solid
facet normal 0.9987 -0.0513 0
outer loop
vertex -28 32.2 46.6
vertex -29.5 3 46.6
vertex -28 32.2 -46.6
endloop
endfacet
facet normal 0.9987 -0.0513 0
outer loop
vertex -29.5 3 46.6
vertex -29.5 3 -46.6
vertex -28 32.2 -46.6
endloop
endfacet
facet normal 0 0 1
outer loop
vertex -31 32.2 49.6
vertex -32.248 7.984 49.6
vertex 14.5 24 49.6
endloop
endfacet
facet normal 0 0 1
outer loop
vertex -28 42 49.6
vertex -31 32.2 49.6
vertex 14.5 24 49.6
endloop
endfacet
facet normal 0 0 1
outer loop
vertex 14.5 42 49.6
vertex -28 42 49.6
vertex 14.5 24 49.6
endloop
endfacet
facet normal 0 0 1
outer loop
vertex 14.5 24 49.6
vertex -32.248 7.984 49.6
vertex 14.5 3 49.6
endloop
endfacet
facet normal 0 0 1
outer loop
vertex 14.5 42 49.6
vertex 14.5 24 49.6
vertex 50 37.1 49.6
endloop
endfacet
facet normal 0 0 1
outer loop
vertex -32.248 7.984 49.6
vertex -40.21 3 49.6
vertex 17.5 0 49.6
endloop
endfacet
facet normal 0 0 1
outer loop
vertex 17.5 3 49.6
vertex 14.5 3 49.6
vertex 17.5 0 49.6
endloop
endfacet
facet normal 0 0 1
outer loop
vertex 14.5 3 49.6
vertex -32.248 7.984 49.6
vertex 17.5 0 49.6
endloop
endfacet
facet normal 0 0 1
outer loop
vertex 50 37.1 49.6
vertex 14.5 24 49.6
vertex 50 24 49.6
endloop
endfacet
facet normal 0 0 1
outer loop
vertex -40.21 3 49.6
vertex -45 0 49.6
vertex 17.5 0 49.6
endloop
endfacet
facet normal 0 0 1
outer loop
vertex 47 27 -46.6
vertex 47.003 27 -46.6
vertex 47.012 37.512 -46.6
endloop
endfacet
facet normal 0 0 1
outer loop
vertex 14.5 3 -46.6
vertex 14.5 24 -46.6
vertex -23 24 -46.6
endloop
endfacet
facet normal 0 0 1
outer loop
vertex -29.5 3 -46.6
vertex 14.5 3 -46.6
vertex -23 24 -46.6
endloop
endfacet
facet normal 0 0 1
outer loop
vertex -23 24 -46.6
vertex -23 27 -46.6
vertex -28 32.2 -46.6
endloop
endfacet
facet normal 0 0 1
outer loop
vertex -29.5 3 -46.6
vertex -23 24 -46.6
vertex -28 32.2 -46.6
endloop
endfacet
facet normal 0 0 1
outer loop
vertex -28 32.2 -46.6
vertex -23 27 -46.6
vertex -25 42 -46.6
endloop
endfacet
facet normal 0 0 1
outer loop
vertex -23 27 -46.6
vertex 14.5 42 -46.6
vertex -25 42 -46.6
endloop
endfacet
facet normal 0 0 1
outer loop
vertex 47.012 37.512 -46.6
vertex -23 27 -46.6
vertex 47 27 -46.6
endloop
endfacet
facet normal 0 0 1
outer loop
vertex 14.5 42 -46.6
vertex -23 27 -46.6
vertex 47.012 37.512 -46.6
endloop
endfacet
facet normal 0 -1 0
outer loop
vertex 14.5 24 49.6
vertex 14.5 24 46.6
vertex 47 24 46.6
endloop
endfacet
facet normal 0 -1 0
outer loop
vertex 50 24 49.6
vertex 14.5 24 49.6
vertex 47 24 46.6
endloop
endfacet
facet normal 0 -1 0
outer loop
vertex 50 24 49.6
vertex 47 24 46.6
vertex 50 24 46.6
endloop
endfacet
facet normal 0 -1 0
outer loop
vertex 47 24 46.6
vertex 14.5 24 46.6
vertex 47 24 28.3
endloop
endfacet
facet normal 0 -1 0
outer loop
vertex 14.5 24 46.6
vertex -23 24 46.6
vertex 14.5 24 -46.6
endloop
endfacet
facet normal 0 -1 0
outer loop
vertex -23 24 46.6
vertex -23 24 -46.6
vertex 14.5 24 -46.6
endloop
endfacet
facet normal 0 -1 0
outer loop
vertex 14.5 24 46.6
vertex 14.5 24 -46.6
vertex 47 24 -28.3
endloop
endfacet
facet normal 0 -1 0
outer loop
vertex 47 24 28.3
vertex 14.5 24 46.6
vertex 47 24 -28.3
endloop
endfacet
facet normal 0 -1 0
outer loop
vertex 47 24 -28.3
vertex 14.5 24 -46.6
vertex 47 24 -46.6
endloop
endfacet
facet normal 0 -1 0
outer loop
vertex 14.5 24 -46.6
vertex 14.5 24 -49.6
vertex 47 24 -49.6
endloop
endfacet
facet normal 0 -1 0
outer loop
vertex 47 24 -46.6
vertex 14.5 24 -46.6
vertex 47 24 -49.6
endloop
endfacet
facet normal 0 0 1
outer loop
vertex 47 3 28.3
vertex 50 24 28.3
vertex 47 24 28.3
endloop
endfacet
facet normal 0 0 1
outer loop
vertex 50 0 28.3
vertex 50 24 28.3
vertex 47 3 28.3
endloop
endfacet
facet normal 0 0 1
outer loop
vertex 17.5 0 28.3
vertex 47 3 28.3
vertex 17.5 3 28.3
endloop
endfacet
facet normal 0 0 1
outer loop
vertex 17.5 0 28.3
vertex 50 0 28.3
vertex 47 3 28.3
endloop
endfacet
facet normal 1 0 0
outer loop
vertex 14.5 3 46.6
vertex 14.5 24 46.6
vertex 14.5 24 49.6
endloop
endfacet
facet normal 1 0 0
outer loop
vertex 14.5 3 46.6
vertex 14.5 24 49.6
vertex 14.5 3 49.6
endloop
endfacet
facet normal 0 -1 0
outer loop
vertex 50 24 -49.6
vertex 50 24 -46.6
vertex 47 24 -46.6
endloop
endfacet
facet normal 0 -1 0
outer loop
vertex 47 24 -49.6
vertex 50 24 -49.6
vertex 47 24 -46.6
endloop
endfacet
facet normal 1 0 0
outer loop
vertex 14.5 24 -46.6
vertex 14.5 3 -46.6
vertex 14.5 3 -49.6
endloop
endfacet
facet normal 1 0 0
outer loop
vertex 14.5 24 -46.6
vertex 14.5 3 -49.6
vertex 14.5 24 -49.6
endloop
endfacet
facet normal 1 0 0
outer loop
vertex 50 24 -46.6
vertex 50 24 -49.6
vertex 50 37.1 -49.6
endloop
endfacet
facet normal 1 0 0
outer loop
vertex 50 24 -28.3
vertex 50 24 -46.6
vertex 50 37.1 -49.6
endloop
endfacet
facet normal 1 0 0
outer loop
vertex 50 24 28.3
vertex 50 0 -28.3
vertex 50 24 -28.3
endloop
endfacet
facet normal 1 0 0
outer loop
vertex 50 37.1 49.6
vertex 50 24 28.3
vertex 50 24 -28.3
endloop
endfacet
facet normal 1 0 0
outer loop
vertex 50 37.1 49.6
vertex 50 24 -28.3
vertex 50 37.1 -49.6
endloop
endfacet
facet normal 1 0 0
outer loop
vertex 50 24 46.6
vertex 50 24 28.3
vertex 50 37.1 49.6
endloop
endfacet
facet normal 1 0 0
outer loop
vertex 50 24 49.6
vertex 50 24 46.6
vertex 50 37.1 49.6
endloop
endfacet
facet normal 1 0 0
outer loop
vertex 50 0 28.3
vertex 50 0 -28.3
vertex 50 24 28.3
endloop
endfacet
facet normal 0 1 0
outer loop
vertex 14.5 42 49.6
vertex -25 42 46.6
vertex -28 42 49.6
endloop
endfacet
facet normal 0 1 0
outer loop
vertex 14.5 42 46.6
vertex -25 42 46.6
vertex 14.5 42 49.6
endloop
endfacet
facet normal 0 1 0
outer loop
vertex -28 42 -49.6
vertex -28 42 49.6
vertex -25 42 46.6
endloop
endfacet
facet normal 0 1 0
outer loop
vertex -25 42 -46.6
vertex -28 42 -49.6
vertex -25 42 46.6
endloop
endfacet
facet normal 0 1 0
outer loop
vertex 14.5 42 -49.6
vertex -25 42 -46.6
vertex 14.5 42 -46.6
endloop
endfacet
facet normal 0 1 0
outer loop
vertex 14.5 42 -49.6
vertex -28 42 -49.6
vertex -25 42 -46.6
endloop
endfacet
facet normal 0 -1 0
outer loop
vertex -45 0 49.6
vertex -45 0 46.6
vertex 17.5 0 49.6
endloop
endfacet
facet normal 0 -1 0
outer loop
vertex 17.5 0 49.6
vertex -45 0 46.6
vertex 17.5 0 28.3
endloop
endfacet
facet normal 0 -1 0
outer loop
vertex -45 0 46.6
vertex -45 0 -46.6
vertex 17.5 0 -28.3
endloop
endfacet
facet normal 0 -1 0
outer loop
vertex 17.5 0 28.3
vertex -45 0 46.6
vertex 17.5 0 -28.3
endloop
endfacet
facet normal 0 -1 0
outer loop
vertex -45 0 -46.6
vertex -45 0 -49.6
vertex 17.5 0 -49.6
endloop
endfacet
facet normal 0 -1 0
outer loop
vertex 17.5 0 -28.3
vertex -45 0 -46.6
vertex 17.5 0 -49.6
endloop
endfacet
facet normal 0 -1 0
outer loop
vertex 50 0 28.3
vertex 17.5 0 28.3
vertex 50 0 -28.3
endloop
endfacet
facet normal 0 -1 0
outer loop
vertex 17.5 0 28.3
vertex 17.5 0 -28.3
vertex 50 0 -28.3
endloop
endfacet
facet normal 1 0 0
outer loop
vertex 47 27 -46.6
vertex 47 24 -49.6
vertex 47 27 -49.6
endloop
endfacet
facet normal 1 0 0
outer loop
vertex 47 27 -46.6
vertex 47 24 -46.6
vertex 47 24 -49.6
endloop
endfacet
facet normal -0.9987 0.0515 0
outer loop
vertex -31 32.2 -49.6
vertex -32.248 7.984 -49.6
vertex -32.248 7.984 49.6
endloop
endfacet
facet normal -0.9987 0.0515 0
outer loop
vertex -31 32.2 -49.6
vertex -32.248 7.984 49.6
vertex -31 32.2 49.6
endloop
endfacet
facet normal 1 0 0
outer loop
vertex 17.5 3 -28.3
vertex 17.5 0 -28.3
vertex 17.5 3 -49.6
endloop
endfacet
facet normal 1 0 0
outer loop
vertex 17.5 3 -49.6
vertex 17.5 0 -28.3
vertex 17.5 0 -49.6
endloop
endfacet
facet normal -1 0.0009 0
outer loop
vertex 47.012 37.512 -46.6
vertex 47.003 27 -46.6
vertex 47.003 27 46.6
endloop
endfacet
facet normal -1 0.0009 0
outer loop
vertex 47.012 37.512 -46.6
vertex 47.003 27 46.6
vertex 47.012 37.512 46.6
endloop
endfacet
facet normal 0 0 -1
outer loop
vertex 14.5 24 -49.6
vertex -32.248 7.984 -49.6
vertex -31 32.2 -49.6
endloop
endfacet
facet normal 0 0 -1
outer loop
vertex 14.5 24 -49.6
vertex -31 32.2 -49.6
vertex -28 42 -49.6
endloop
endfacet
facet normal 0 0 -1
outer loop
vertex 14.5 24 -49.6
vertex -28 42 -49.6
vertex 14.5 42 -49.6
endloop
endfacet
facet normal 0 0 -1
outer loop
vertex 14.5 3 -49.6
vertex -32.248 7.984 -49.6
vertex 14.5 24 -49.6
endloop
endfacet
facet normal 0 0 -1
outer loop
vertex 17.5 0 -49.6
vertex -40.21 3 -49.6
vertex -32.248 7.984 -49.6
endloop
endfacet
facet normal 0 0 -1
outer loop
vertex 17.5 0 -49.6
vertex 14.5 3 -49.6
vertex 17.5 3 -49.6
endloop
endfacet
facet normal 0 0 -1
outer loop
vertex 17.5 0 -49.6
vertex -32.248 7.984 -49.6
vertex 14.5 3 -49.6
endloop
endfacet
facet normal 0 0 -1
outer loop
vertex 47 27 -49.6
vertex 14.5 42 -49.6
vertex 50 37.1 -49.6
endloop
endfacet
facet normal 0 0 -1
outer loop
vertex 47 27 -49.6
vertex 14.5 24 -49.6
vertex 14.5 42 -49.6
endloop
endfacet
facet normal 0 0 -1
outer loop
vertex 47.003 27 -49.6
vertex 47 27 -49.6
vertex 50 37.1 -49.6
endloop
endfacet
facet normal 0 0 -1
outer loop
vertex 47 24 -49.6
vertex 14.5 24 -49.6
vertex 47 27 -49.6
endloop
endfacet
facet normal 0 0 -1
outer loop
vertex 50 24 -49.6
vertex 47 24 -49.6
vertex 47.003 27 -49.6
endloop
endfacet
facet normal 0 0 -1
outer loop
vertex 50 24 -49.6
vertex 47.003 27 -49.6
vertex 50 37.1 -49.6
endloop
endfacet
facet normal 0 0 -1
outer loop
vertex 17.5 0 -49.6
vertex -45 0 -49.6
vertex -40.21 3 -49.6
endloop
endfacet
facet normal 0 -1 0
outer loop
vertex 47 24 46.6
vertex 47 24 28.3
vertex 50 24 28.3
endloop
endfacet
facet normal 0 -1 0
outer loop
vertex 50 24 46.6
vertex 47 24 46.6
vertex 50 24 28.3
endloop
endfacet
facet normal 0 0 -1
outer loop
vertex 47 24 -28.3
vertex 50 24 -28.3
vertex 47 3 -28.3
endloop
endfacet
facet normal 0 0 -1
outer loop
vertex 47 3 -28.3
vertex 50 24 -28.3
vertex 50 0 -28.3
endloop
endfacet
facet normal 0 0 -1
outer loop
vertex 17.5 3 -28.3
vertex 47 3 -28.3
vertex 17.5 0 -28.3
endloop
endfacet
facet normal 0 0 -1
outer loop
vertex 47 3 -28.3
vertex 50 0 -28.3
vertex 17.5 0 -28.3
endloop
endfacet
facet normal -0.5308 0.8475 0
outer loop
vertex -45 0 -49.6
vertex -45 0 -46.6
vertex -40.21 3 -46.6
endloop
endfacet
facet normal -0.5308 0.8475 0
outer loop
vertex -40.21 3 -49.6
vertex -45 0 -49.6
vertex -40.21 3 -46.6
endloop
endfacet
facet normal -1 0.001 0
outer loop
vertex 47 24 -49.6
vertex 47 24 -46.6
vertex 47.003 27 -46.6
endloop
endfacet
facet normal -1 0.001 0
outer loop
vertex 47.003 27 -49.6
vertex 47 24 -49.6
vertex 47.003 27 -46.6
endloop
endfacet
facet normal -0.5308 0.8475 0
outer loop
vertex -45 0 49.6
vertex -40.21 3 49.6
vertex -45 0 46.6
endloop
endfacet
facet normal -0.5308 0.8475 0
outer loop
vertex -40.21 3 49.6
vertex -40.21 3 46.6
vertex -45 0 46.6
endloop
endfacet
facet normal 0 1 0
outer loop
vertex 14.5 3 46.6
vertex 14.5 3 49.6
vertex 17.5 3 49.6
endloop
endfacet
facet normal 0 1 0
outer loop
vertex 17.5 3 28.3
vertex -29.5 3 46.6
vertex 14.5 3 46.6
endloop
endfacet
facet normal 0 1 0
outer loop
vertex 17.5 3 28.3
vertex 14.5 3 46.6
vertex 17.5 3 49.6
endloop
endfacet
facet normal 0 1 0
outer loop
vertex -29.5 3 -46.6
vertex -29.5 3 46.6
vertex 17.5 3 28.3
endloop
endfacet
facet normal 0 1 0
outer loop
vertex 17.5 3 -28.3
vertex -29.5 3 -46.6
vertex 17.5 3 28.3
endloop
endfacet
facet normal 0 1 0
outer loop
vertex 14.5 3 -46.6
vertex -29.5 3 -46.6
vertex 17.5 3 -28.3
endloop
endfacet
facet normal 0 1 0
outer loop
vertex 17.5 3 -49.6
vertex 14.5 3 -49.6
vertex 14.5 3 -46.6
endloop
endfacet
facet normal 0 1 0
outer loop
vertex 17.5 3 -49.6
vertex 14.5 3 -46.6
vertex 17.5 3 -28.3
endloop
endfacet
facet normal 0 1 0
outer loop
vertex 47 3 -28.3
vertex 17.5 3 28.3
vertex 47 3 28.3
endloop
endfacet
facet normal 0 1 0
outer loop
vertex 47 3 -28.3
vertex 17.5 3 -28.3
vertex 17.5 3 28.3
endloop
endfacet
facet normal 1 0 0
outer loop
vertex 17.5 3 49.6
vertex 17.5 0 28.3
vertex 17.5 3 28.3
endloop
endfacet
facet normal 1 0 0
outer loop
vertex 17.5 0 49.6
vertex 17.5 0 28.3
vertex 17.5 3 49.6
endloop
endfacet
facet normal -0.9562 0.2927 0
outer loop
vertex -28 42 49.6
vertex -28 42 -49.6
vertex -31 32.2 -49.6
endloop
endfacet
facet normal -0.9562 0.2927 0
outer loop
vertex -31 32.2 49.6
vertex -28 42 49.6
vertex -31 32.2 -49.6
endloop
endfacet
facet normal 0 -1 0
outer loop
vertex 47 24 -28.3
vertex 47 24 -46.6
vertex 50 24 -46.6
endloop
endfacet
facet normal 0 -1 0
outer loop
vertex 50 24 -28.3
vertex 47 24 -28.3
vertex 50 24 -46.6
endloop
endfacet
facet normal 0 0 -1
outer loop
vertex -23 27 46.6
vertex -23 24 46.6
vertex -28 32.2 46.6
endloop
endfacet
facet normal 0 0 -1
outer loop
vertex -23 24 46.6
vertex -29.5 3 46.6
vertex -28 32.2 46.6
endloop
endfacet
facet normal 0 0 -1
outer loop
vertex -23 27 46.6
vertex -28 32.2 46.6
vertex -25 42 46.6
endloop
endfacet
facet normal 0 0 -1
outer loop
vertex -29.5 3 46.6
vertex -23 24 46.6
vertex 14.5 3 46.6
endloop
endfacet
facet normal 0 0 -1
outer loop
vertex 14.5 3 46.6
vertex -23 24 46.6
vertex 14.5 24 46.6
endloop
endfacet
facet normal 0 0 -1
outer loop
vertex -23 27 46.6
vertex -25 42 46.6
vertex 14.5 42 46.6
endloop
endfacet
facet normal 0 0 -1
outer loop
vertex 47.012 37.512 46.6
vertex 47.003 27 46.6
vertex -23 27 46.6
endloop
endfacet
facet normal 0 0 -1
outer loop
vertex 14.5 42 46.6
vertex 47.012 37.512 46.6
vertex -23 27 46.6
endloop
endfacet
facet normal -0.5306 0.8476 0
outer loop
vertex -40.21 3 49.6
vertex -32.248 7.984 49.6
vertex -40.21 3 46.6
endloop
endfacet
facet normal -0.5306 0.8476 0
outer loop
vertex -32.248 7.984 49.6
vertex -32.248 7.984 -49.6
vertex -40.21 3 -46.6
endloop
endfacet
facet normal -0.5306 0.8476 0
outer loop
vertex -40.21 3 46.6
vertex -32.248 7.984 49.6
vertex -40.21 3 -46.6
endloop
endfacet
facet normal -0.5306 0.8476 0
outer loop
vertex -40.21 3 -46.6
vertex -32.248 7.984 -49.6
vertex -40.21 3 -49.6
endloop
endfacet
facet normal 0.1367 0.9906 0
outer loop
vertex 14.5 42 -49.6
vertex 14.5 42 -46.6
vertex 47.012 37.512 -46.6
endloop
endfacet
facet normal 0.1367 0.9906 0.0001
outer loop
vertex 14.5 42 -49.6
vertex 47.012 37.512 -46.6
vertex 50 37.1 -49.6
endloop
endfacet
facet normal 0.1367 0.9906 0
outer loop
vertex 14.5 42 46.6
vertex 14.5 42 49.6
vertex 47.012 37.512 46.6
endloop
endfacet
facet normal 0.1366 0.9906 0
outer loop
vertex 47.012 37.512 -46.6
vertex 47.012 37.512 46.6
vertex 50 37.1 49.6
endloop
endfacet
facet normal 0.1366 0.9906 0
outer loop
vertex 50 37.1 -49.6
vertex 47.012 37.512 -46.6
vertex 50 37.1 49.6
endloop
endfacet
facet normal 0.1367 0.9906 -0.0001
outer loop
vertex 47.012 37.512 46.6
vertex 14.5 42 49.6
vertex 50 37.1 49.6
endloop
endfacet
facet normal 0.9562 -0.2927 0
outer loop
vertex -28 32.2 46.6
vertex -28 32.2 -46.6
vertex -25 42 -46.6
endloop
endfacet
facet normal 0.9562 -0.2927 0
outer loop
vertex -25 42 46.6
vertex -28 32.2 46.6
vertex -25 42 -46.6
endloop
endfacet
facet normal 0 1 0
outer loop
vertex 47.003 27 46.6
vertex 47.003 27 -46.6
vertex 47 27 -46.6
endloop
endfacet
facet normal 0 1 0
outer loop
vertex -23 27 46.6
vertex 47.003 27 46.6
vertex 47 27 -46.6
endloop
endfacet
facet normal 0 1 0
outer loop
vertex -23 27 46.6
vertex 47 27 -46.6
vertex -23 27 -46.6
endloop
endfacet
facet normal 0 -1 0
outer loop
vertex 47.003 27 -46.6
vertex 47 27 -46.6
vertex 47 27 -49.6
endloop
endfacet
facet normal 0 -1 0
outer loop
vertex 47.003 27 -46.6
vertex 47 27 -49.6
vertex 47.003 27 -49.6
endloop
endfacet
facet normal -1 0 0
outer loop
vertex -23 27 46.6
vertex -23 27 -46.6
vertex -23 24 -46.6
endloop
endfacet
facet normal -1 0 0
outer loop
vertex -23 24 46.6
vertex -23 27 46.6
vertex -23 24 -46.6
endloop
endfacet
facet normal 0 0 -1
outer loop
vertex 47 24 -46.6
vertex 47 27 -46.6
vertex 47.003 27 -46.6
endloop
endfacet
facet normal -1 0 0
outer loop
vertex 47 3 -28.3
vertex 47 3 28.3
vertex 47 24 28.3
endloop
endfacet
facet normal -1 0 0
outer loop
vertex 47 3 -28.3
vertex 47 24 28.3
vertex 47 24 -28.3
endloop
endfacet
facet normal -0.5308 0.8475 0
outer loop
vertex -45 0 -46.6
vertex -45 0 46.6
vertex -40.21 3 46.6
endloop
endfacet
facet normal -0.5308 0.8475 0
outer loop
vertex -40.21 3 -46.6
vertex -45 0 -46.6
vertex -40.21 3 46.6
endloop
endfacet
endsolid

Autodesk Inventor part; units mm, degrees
ref_plane "YZ Plane" through (0, 0, 0) normal (1, 0, 0) x (0, 1, 0)
ref_plane "XZ Plane" through (0, 0, 0) normal (0, 1, 0) x (-1, 0, 0)
ref_plane "XY Plane" through (0, 0, 0) normal (0, 0, 1) x (1, 0, 0)
sketch "Esboço1" plane through (0, 0, 0) normal (0, 1, 0) x (-1, 0, 0)
  line L0 (50, 50) -> (50, -50)
  line L1 (-50, -50) -> (-50, 50)
  line L2 (-50, -2) -> (-50, 2)
  line L3 (-50, -2) -> (-50, -28.3)
  line L4 (-50, 2) -> (-50, 28.3)
  line L5 (-50, 28.3) -> (-17.5, 28.3)
  line L6 (-50, -28.3) -> (-17.5, -28.3)
  line L7 (-17.5, -28.3) -> (-17.5, -49.6)
  line L8 (-17.5, 28.3) -> (-17.5, 49.6)
  line L9 (-39.9, -28.3) -> (-27.6, -28.3)
  line L10 (-27.6, -28.3) -> (-27.6, -2.3)
  line L11 (-27.6, -2.3) -> (-39.9, -2.3)
  line L12 (-39.9, -2.3) -> (-39.9, -28.3)
  line L13 (-27.6, 28.3) -> (-27.6, 2.3)
  line L14 (-27.6, 2.3) -> (-39.9, 2.3)
  line L15 (-39.9, 2.3) -> (-39.9, 28.3)
  line L16 (50, 50) -> (45, 50)
  line L17 (50, -50) -> (45, -50)
  line L18 (45, 50) -> (45, -50)
  line L19 (-17.5, -28.3) -> (-14.5, -28.3)
  line L20 (-14.5, -49.6) -> (-17.5, -49.6)
  line L21 (-17.5, 28.3) -> (-14.5, 28.3)
  line L22 (-14.5, 49.6) -> (-17.5, 49.6)
  line L23 (-9.5, -35) -> (-9.5, 35)
  line L24 (-9.5, -35) -> (24.5, -35)
  line L25 (24.5, -35) -> (24.5, 35)
  line L26 (24.5, 35) -> (-9.5, 35)
  line L27 (29.5, 35) -> (29.5, -35)
  line L28 (-14.5, 49.6) -> (29.5, 49.6)
  line L29 (29.5, 49.6) -> (29.5, -49.6)
  line L30 (29.5, -49.6) -> (-14.5, -49.6)
  line L31 (26.5, -46.6) -> (26.5, 46.6)
  line L32 (-14.5, -28.3) -> (-17.5, -28.3)
  line L33 (-14.5, -28.3) -> (-14.5, -46.6)
  line L34 (-14.5, 46.6) -> (-14.5, 28.3)
  line L35 (26.5, -46.6) -> (-14.5, -46.6)
  line L36 (26.5, 46.6) -> (-14.5, 46.6)
  line L37 (-50, 28.3) -> (-47, 28.3)
  line L38 (-47, 28.3) -> (-47, -28.3)
  line L39 (-14.5, -28.3) -> (-14.5, -25.3)
  line L40 (-14.5, -25.3) -> (-17.5, -25.3)
  line L41 (-17.5, -25.3) -> (-22.5, -25.3)
  line L42 (-22.5, -25.3) -> (-22.5, -28.3)
  line L43 (-14.5, 28.3) -> (-14.5, 25.3)
  line L44 (-14.5, 25.3) -> (-17.5, 25.3)
  line L45 (-17.5, 25.3) -> (-22.5, 25.3)
  line L46 (-22.5, 25.3) -> (-22.5, 28.3)
  point P0 (0, 0)
  point P1 (-50, 0)
  point P2 (-33.75, -28.3)
  dimension "d0" = 100
  dimension "d1" = 100
  dimension "d2" = 4
  dimension "d3" = 26.3
  dimension "d4" = 26.3
  dimension "d5" = 32.5
  dimension "d6" = 32.5
  dimension "d7" = 21.3
  dimension "d8" = 21.3
  dimension "d9" = 12.3
  dimension "d10" = 26
  dimension "d11" = 26
  dimension "d12" = 5
  dimension "d13" = 5
  dimension "d14" = 3
  dimension "d15" = 3
  dimension "d17" = 70
  dimension "d18" = 34
  dimension "d19" = 5
  dimension "d20" = 3
  dimension "d23" = 3
  dimension "d42" = 5
  dimension "d43" = 3
  dimension "d44" = 5
extrude "Extrusão1" add sketch "Esboço1" along normal blind 3 contours L38 L5 L15 L14 L13 L46 L45 L44 L43 L34 L36 L31 L35 L33 L39 L40 L41 L42 L6 L10 L11 L12 | L12 L11 L10 L6 | L5 L13 L14 L15 | L42 L41 L40 L39 L19 L6 | L5 L21 L43 L44 L45 L46 | L23 L26 L25 L24
extrude "Extrusão2" add sketch "Esboço1" along normal blind 27 contours L1 L5 L38 L6
sketch "Esboço2" plane through (14.5, 0, -46.6) normal (0, 0, -1) x (-1, 0, 0)
  line L0 (41, 0) -> (0, 0) projected
  line L1 (41, 0) -> (59.5, 0)
  line L2 (41, 0) -> (41, 3) projected
  line L3 (41, 0) -> (41, 3)
  line L4 (41, 3) -> (0, 3) projected
  line L5 (-32.5, 3) -> (0, 3) projected
  line L6 (-32.5, 3) -> (-32.5, 27) projected
  line L7 (-32.5, 27) -> (-32.5, 24)
  line L8 (-32.5, 27) -> (3, 27)
  line L9 (3, 27) -> (3, 24)
  line L10 (3, 24) -> (-32.5, 24)
  line L11 (0, 3) -> (0, 27)
  line L12 (0, 3) -> (3, 3)
  line L13 (3, 3) -> (37, 3)
  line L14 (0, 3) -> (-35.5, 3)
  line L15 (-35.5, 0) -> (-35.5, 27) projected
  line L16 (-11.75, 3) -> (-23.75, 3)
  line L17 (-23.75, 3) -> (-23.75, 15)
  line L18 (-23.75, 15) -> (-11.75, 15)
  line L19 (-11.75, 15) -> (-11.75, 3)
  line L20 (3, 3) -> (3, 21)
  line L21 (0, 27) -> (0, 42)
  line L22 (37, 3) -> (37, 21)
  line L23 (37, 21) -> (3, 21)
  line L24 (41, 3) -> (55.9231, 3)
  line L25 (0, 3) -> (41, 3) projected
  line L26 (-32.5, 27) -> (-35.5, 27) projected
  line L27 (-32.5, 27) -> (37.5, 27)
  line L28 (0, 42) -> (38, 42)
  line L29 (0, 42) -> (39.5, 42)
  line L30 (39.5, 42) -> (42.5, 32.2)
  line L31 (3, 24) -> (37.5, 24)
  line L32 (37.5, 24) -> (37.5, 27)
  line L33 (-23.75, 3) -> (-11.75, 15)
  line L34 (-23.75, 15) -> (-11.75, 3)
  line L35 (42.5, 3) -> (44, 3)
  line L36 (44, 3) -> (42.5, 32.2)
  line L37 (59.5, 0) -> (57, 0)
  line L38 (-17.75, 24) -> (-17.75, 3)
  line L39 (0, 27) -> (0, 37)
  line L40 (-35.5, 27) -> (-35.5, 32)
  line L41 (39.5, 42) -> (42.5, 42)
  line L42 (42.5, 32.2) -> (45.5, 32.2)
  line L43 (43.7518, 7.8322) -> (46.7478, 7.9861)
  line L44 (45.5, 32.2) -> (42.5, 42)
  line L45 (45.5, 32.2) -> (46.7478, 7.9861)
  line L46 (59.5, 0) -> (62, 0)
  line L47 (59.5, 0) -> (46.7478, 7.9861)
  line L48 (0, 42) -> (-35.5, 37.1)
  line L49 (-35.5, 37.1) -> (-35.5, 32)
  point P0 (14.5, 0)
  point P1 (0, 24)
  point P2 (54.7096, 3)
  dimension "d28" = 18.5
  dimension "d31" = 3
  dimension "d32" = 35.5
  dimension "d33" = 3
  dimension "d34" = 34
  dimension "d35" = 12
  dimension "d36" = 12
  dimension "d37" = 18
  dimension "d38" = 15
  dimension "d50" = 18
  dimension "d55" = 70
  dimension "d57" = 38
  dimension "d61" = 1.5
  dimension "d62" = 2.5
  dimension "d63" = 10
  dimension "d64" = 5
  dimension "d65" = 3
  dimension "d66" = 3
  dimension "d67" = 3
  dimension "d68" = 2.5
extrude "Extrusão3" add sketch "Esboço1" along normal blind 3 contours L19 L33 L35 L31 L36 L34 L21 L8 L22 L28 L29 L27 L30 L20 L7
extrude "Extrusão7" add sketch "Esboço2" along normal blind 3 contours L2 L24 L47 L1 | L4 L22 L23 L20 L11 L10 L31 L32 L27 L8 L21 L28 L29 L30 L36 L24 | L4 L20 L23 L22 | L11 L8 L9 L10 | L10 L6 L8 L11 | L9 L27 L32 L31 | L8 L26 L40 L49 L48 L21
mirror "Espelhar2" about plane through (0, 0, 0) normal (0, 0, 1) of "Extrusão7"
sketch "Esboço4" plane through (14.5, 0, -46.6) normal (0, 0, 1) x (1, 0, 0)
  line L0 (32.5, 27) -> (-37.5, 27)
  line L1 (-37.5, 27) -> (-37.5, 24)
  line L2 (-37.5, 24) -> (32.5, 24)
  line L3 (32.5, 24) -> (32.5, 27)
  line L4 (32.5, 27) -> (35.5, 27)
  line L5 (35.5, 27) -> (35.5, 24)
  line L6 (35.5, 24) -> (32.5, 24)
  point P0 (-14.5, 0)
  dimension "d71" = 70
  dimension "d72" = 3
  dimension "d73" = 3
  dimension "d74" = 3
extrude "Extrusão8" add sketch "Esboço4" along normal blind 96.2
sketch "Esboço5" plane through (14.5, 42, 46.6) normal (0, 0, -1) x (-1, 0, 0)
  line L0 (-32.5, -15) -> (-32.5, -18) projected
  line L1 (-32.5, -18) -> (-32.5117, -4.4875)
  line L2 (0, 0) -> (-35.5, -4.9) projected
  line L3 (-32.5117, -4.4875) -> (-35.5, -4.9)
  line L4 (-35.5, -18) -> (0, -18) projected
  line L5 (-35.5, -4.9) -> (-35.5, -18)
  line L6 (-35.5, -18) -> (-32.5, -18)
  point P0 (14.5, -42)
extrude "Extrusão9" add sketch "Esboço5" along normal blind 96.2
sketch "Esboço6" plane through (17.5, 0, -49.6) normal (0, 0, -1) x (-1, 0, 0)
  line L0 (42.5, 42) -> (3, 42) projected
  line L1 (42.5, 42) -> (45.5, 42)
  line L2 (47, 3) -> (45.5, 32.2) projected
  line L3 (45.5, 32.2) -> (48.5, 32.2)
  line L4 (46.7519, 7.8299) -> (49.7479, 7.9838)
  line L5 (57.7096, 3) -> (47, 3) projected
  line L6 (49.7479, 7.9838) -> (57.7096, 3)
  line L7 (49.7479, 7.9838) -> (48.5, 32.2)
  line L8 (45.5, 42) -> (48.5, 32.2)
  line L9 (45.5, 32.2) -> (42.5, 42) projected
  line L10 (42.5, 42) -> (45.5, 32.2)
  point P0 (17.5, 0)
  dimension "d79" = 3
  dimension "d80" = 3
  dimension "d81" = 3
sketch "Esboço7" plane through (14.5, 0, -46.6) normal (0, 0, 1) x (1, 0, 0)
  line L0 (-44, 3) -> (-44, 0) projected
  line L1 (-44, 3) -> (-44, 0)
  line L2 (-54.7096, 3) -> (-44, 3) projected
  line L3 (-44, 3) -> (-54.7096, 3)
  line L4 (-59.5, 0) -> (-54.7096, 3) projected
  line L5 (-54.7096, 3) -> (-59.5, 0)
  line L6 (-59.5, 0) -> (-44, 0)
  point P0 (-14.5, 0)
extrude "Extrusão10" add sketch "Esboço7" along normal blind 96.2
extrude "Extrusão11" add sketch "Esboço6" against normal blind 99.2
